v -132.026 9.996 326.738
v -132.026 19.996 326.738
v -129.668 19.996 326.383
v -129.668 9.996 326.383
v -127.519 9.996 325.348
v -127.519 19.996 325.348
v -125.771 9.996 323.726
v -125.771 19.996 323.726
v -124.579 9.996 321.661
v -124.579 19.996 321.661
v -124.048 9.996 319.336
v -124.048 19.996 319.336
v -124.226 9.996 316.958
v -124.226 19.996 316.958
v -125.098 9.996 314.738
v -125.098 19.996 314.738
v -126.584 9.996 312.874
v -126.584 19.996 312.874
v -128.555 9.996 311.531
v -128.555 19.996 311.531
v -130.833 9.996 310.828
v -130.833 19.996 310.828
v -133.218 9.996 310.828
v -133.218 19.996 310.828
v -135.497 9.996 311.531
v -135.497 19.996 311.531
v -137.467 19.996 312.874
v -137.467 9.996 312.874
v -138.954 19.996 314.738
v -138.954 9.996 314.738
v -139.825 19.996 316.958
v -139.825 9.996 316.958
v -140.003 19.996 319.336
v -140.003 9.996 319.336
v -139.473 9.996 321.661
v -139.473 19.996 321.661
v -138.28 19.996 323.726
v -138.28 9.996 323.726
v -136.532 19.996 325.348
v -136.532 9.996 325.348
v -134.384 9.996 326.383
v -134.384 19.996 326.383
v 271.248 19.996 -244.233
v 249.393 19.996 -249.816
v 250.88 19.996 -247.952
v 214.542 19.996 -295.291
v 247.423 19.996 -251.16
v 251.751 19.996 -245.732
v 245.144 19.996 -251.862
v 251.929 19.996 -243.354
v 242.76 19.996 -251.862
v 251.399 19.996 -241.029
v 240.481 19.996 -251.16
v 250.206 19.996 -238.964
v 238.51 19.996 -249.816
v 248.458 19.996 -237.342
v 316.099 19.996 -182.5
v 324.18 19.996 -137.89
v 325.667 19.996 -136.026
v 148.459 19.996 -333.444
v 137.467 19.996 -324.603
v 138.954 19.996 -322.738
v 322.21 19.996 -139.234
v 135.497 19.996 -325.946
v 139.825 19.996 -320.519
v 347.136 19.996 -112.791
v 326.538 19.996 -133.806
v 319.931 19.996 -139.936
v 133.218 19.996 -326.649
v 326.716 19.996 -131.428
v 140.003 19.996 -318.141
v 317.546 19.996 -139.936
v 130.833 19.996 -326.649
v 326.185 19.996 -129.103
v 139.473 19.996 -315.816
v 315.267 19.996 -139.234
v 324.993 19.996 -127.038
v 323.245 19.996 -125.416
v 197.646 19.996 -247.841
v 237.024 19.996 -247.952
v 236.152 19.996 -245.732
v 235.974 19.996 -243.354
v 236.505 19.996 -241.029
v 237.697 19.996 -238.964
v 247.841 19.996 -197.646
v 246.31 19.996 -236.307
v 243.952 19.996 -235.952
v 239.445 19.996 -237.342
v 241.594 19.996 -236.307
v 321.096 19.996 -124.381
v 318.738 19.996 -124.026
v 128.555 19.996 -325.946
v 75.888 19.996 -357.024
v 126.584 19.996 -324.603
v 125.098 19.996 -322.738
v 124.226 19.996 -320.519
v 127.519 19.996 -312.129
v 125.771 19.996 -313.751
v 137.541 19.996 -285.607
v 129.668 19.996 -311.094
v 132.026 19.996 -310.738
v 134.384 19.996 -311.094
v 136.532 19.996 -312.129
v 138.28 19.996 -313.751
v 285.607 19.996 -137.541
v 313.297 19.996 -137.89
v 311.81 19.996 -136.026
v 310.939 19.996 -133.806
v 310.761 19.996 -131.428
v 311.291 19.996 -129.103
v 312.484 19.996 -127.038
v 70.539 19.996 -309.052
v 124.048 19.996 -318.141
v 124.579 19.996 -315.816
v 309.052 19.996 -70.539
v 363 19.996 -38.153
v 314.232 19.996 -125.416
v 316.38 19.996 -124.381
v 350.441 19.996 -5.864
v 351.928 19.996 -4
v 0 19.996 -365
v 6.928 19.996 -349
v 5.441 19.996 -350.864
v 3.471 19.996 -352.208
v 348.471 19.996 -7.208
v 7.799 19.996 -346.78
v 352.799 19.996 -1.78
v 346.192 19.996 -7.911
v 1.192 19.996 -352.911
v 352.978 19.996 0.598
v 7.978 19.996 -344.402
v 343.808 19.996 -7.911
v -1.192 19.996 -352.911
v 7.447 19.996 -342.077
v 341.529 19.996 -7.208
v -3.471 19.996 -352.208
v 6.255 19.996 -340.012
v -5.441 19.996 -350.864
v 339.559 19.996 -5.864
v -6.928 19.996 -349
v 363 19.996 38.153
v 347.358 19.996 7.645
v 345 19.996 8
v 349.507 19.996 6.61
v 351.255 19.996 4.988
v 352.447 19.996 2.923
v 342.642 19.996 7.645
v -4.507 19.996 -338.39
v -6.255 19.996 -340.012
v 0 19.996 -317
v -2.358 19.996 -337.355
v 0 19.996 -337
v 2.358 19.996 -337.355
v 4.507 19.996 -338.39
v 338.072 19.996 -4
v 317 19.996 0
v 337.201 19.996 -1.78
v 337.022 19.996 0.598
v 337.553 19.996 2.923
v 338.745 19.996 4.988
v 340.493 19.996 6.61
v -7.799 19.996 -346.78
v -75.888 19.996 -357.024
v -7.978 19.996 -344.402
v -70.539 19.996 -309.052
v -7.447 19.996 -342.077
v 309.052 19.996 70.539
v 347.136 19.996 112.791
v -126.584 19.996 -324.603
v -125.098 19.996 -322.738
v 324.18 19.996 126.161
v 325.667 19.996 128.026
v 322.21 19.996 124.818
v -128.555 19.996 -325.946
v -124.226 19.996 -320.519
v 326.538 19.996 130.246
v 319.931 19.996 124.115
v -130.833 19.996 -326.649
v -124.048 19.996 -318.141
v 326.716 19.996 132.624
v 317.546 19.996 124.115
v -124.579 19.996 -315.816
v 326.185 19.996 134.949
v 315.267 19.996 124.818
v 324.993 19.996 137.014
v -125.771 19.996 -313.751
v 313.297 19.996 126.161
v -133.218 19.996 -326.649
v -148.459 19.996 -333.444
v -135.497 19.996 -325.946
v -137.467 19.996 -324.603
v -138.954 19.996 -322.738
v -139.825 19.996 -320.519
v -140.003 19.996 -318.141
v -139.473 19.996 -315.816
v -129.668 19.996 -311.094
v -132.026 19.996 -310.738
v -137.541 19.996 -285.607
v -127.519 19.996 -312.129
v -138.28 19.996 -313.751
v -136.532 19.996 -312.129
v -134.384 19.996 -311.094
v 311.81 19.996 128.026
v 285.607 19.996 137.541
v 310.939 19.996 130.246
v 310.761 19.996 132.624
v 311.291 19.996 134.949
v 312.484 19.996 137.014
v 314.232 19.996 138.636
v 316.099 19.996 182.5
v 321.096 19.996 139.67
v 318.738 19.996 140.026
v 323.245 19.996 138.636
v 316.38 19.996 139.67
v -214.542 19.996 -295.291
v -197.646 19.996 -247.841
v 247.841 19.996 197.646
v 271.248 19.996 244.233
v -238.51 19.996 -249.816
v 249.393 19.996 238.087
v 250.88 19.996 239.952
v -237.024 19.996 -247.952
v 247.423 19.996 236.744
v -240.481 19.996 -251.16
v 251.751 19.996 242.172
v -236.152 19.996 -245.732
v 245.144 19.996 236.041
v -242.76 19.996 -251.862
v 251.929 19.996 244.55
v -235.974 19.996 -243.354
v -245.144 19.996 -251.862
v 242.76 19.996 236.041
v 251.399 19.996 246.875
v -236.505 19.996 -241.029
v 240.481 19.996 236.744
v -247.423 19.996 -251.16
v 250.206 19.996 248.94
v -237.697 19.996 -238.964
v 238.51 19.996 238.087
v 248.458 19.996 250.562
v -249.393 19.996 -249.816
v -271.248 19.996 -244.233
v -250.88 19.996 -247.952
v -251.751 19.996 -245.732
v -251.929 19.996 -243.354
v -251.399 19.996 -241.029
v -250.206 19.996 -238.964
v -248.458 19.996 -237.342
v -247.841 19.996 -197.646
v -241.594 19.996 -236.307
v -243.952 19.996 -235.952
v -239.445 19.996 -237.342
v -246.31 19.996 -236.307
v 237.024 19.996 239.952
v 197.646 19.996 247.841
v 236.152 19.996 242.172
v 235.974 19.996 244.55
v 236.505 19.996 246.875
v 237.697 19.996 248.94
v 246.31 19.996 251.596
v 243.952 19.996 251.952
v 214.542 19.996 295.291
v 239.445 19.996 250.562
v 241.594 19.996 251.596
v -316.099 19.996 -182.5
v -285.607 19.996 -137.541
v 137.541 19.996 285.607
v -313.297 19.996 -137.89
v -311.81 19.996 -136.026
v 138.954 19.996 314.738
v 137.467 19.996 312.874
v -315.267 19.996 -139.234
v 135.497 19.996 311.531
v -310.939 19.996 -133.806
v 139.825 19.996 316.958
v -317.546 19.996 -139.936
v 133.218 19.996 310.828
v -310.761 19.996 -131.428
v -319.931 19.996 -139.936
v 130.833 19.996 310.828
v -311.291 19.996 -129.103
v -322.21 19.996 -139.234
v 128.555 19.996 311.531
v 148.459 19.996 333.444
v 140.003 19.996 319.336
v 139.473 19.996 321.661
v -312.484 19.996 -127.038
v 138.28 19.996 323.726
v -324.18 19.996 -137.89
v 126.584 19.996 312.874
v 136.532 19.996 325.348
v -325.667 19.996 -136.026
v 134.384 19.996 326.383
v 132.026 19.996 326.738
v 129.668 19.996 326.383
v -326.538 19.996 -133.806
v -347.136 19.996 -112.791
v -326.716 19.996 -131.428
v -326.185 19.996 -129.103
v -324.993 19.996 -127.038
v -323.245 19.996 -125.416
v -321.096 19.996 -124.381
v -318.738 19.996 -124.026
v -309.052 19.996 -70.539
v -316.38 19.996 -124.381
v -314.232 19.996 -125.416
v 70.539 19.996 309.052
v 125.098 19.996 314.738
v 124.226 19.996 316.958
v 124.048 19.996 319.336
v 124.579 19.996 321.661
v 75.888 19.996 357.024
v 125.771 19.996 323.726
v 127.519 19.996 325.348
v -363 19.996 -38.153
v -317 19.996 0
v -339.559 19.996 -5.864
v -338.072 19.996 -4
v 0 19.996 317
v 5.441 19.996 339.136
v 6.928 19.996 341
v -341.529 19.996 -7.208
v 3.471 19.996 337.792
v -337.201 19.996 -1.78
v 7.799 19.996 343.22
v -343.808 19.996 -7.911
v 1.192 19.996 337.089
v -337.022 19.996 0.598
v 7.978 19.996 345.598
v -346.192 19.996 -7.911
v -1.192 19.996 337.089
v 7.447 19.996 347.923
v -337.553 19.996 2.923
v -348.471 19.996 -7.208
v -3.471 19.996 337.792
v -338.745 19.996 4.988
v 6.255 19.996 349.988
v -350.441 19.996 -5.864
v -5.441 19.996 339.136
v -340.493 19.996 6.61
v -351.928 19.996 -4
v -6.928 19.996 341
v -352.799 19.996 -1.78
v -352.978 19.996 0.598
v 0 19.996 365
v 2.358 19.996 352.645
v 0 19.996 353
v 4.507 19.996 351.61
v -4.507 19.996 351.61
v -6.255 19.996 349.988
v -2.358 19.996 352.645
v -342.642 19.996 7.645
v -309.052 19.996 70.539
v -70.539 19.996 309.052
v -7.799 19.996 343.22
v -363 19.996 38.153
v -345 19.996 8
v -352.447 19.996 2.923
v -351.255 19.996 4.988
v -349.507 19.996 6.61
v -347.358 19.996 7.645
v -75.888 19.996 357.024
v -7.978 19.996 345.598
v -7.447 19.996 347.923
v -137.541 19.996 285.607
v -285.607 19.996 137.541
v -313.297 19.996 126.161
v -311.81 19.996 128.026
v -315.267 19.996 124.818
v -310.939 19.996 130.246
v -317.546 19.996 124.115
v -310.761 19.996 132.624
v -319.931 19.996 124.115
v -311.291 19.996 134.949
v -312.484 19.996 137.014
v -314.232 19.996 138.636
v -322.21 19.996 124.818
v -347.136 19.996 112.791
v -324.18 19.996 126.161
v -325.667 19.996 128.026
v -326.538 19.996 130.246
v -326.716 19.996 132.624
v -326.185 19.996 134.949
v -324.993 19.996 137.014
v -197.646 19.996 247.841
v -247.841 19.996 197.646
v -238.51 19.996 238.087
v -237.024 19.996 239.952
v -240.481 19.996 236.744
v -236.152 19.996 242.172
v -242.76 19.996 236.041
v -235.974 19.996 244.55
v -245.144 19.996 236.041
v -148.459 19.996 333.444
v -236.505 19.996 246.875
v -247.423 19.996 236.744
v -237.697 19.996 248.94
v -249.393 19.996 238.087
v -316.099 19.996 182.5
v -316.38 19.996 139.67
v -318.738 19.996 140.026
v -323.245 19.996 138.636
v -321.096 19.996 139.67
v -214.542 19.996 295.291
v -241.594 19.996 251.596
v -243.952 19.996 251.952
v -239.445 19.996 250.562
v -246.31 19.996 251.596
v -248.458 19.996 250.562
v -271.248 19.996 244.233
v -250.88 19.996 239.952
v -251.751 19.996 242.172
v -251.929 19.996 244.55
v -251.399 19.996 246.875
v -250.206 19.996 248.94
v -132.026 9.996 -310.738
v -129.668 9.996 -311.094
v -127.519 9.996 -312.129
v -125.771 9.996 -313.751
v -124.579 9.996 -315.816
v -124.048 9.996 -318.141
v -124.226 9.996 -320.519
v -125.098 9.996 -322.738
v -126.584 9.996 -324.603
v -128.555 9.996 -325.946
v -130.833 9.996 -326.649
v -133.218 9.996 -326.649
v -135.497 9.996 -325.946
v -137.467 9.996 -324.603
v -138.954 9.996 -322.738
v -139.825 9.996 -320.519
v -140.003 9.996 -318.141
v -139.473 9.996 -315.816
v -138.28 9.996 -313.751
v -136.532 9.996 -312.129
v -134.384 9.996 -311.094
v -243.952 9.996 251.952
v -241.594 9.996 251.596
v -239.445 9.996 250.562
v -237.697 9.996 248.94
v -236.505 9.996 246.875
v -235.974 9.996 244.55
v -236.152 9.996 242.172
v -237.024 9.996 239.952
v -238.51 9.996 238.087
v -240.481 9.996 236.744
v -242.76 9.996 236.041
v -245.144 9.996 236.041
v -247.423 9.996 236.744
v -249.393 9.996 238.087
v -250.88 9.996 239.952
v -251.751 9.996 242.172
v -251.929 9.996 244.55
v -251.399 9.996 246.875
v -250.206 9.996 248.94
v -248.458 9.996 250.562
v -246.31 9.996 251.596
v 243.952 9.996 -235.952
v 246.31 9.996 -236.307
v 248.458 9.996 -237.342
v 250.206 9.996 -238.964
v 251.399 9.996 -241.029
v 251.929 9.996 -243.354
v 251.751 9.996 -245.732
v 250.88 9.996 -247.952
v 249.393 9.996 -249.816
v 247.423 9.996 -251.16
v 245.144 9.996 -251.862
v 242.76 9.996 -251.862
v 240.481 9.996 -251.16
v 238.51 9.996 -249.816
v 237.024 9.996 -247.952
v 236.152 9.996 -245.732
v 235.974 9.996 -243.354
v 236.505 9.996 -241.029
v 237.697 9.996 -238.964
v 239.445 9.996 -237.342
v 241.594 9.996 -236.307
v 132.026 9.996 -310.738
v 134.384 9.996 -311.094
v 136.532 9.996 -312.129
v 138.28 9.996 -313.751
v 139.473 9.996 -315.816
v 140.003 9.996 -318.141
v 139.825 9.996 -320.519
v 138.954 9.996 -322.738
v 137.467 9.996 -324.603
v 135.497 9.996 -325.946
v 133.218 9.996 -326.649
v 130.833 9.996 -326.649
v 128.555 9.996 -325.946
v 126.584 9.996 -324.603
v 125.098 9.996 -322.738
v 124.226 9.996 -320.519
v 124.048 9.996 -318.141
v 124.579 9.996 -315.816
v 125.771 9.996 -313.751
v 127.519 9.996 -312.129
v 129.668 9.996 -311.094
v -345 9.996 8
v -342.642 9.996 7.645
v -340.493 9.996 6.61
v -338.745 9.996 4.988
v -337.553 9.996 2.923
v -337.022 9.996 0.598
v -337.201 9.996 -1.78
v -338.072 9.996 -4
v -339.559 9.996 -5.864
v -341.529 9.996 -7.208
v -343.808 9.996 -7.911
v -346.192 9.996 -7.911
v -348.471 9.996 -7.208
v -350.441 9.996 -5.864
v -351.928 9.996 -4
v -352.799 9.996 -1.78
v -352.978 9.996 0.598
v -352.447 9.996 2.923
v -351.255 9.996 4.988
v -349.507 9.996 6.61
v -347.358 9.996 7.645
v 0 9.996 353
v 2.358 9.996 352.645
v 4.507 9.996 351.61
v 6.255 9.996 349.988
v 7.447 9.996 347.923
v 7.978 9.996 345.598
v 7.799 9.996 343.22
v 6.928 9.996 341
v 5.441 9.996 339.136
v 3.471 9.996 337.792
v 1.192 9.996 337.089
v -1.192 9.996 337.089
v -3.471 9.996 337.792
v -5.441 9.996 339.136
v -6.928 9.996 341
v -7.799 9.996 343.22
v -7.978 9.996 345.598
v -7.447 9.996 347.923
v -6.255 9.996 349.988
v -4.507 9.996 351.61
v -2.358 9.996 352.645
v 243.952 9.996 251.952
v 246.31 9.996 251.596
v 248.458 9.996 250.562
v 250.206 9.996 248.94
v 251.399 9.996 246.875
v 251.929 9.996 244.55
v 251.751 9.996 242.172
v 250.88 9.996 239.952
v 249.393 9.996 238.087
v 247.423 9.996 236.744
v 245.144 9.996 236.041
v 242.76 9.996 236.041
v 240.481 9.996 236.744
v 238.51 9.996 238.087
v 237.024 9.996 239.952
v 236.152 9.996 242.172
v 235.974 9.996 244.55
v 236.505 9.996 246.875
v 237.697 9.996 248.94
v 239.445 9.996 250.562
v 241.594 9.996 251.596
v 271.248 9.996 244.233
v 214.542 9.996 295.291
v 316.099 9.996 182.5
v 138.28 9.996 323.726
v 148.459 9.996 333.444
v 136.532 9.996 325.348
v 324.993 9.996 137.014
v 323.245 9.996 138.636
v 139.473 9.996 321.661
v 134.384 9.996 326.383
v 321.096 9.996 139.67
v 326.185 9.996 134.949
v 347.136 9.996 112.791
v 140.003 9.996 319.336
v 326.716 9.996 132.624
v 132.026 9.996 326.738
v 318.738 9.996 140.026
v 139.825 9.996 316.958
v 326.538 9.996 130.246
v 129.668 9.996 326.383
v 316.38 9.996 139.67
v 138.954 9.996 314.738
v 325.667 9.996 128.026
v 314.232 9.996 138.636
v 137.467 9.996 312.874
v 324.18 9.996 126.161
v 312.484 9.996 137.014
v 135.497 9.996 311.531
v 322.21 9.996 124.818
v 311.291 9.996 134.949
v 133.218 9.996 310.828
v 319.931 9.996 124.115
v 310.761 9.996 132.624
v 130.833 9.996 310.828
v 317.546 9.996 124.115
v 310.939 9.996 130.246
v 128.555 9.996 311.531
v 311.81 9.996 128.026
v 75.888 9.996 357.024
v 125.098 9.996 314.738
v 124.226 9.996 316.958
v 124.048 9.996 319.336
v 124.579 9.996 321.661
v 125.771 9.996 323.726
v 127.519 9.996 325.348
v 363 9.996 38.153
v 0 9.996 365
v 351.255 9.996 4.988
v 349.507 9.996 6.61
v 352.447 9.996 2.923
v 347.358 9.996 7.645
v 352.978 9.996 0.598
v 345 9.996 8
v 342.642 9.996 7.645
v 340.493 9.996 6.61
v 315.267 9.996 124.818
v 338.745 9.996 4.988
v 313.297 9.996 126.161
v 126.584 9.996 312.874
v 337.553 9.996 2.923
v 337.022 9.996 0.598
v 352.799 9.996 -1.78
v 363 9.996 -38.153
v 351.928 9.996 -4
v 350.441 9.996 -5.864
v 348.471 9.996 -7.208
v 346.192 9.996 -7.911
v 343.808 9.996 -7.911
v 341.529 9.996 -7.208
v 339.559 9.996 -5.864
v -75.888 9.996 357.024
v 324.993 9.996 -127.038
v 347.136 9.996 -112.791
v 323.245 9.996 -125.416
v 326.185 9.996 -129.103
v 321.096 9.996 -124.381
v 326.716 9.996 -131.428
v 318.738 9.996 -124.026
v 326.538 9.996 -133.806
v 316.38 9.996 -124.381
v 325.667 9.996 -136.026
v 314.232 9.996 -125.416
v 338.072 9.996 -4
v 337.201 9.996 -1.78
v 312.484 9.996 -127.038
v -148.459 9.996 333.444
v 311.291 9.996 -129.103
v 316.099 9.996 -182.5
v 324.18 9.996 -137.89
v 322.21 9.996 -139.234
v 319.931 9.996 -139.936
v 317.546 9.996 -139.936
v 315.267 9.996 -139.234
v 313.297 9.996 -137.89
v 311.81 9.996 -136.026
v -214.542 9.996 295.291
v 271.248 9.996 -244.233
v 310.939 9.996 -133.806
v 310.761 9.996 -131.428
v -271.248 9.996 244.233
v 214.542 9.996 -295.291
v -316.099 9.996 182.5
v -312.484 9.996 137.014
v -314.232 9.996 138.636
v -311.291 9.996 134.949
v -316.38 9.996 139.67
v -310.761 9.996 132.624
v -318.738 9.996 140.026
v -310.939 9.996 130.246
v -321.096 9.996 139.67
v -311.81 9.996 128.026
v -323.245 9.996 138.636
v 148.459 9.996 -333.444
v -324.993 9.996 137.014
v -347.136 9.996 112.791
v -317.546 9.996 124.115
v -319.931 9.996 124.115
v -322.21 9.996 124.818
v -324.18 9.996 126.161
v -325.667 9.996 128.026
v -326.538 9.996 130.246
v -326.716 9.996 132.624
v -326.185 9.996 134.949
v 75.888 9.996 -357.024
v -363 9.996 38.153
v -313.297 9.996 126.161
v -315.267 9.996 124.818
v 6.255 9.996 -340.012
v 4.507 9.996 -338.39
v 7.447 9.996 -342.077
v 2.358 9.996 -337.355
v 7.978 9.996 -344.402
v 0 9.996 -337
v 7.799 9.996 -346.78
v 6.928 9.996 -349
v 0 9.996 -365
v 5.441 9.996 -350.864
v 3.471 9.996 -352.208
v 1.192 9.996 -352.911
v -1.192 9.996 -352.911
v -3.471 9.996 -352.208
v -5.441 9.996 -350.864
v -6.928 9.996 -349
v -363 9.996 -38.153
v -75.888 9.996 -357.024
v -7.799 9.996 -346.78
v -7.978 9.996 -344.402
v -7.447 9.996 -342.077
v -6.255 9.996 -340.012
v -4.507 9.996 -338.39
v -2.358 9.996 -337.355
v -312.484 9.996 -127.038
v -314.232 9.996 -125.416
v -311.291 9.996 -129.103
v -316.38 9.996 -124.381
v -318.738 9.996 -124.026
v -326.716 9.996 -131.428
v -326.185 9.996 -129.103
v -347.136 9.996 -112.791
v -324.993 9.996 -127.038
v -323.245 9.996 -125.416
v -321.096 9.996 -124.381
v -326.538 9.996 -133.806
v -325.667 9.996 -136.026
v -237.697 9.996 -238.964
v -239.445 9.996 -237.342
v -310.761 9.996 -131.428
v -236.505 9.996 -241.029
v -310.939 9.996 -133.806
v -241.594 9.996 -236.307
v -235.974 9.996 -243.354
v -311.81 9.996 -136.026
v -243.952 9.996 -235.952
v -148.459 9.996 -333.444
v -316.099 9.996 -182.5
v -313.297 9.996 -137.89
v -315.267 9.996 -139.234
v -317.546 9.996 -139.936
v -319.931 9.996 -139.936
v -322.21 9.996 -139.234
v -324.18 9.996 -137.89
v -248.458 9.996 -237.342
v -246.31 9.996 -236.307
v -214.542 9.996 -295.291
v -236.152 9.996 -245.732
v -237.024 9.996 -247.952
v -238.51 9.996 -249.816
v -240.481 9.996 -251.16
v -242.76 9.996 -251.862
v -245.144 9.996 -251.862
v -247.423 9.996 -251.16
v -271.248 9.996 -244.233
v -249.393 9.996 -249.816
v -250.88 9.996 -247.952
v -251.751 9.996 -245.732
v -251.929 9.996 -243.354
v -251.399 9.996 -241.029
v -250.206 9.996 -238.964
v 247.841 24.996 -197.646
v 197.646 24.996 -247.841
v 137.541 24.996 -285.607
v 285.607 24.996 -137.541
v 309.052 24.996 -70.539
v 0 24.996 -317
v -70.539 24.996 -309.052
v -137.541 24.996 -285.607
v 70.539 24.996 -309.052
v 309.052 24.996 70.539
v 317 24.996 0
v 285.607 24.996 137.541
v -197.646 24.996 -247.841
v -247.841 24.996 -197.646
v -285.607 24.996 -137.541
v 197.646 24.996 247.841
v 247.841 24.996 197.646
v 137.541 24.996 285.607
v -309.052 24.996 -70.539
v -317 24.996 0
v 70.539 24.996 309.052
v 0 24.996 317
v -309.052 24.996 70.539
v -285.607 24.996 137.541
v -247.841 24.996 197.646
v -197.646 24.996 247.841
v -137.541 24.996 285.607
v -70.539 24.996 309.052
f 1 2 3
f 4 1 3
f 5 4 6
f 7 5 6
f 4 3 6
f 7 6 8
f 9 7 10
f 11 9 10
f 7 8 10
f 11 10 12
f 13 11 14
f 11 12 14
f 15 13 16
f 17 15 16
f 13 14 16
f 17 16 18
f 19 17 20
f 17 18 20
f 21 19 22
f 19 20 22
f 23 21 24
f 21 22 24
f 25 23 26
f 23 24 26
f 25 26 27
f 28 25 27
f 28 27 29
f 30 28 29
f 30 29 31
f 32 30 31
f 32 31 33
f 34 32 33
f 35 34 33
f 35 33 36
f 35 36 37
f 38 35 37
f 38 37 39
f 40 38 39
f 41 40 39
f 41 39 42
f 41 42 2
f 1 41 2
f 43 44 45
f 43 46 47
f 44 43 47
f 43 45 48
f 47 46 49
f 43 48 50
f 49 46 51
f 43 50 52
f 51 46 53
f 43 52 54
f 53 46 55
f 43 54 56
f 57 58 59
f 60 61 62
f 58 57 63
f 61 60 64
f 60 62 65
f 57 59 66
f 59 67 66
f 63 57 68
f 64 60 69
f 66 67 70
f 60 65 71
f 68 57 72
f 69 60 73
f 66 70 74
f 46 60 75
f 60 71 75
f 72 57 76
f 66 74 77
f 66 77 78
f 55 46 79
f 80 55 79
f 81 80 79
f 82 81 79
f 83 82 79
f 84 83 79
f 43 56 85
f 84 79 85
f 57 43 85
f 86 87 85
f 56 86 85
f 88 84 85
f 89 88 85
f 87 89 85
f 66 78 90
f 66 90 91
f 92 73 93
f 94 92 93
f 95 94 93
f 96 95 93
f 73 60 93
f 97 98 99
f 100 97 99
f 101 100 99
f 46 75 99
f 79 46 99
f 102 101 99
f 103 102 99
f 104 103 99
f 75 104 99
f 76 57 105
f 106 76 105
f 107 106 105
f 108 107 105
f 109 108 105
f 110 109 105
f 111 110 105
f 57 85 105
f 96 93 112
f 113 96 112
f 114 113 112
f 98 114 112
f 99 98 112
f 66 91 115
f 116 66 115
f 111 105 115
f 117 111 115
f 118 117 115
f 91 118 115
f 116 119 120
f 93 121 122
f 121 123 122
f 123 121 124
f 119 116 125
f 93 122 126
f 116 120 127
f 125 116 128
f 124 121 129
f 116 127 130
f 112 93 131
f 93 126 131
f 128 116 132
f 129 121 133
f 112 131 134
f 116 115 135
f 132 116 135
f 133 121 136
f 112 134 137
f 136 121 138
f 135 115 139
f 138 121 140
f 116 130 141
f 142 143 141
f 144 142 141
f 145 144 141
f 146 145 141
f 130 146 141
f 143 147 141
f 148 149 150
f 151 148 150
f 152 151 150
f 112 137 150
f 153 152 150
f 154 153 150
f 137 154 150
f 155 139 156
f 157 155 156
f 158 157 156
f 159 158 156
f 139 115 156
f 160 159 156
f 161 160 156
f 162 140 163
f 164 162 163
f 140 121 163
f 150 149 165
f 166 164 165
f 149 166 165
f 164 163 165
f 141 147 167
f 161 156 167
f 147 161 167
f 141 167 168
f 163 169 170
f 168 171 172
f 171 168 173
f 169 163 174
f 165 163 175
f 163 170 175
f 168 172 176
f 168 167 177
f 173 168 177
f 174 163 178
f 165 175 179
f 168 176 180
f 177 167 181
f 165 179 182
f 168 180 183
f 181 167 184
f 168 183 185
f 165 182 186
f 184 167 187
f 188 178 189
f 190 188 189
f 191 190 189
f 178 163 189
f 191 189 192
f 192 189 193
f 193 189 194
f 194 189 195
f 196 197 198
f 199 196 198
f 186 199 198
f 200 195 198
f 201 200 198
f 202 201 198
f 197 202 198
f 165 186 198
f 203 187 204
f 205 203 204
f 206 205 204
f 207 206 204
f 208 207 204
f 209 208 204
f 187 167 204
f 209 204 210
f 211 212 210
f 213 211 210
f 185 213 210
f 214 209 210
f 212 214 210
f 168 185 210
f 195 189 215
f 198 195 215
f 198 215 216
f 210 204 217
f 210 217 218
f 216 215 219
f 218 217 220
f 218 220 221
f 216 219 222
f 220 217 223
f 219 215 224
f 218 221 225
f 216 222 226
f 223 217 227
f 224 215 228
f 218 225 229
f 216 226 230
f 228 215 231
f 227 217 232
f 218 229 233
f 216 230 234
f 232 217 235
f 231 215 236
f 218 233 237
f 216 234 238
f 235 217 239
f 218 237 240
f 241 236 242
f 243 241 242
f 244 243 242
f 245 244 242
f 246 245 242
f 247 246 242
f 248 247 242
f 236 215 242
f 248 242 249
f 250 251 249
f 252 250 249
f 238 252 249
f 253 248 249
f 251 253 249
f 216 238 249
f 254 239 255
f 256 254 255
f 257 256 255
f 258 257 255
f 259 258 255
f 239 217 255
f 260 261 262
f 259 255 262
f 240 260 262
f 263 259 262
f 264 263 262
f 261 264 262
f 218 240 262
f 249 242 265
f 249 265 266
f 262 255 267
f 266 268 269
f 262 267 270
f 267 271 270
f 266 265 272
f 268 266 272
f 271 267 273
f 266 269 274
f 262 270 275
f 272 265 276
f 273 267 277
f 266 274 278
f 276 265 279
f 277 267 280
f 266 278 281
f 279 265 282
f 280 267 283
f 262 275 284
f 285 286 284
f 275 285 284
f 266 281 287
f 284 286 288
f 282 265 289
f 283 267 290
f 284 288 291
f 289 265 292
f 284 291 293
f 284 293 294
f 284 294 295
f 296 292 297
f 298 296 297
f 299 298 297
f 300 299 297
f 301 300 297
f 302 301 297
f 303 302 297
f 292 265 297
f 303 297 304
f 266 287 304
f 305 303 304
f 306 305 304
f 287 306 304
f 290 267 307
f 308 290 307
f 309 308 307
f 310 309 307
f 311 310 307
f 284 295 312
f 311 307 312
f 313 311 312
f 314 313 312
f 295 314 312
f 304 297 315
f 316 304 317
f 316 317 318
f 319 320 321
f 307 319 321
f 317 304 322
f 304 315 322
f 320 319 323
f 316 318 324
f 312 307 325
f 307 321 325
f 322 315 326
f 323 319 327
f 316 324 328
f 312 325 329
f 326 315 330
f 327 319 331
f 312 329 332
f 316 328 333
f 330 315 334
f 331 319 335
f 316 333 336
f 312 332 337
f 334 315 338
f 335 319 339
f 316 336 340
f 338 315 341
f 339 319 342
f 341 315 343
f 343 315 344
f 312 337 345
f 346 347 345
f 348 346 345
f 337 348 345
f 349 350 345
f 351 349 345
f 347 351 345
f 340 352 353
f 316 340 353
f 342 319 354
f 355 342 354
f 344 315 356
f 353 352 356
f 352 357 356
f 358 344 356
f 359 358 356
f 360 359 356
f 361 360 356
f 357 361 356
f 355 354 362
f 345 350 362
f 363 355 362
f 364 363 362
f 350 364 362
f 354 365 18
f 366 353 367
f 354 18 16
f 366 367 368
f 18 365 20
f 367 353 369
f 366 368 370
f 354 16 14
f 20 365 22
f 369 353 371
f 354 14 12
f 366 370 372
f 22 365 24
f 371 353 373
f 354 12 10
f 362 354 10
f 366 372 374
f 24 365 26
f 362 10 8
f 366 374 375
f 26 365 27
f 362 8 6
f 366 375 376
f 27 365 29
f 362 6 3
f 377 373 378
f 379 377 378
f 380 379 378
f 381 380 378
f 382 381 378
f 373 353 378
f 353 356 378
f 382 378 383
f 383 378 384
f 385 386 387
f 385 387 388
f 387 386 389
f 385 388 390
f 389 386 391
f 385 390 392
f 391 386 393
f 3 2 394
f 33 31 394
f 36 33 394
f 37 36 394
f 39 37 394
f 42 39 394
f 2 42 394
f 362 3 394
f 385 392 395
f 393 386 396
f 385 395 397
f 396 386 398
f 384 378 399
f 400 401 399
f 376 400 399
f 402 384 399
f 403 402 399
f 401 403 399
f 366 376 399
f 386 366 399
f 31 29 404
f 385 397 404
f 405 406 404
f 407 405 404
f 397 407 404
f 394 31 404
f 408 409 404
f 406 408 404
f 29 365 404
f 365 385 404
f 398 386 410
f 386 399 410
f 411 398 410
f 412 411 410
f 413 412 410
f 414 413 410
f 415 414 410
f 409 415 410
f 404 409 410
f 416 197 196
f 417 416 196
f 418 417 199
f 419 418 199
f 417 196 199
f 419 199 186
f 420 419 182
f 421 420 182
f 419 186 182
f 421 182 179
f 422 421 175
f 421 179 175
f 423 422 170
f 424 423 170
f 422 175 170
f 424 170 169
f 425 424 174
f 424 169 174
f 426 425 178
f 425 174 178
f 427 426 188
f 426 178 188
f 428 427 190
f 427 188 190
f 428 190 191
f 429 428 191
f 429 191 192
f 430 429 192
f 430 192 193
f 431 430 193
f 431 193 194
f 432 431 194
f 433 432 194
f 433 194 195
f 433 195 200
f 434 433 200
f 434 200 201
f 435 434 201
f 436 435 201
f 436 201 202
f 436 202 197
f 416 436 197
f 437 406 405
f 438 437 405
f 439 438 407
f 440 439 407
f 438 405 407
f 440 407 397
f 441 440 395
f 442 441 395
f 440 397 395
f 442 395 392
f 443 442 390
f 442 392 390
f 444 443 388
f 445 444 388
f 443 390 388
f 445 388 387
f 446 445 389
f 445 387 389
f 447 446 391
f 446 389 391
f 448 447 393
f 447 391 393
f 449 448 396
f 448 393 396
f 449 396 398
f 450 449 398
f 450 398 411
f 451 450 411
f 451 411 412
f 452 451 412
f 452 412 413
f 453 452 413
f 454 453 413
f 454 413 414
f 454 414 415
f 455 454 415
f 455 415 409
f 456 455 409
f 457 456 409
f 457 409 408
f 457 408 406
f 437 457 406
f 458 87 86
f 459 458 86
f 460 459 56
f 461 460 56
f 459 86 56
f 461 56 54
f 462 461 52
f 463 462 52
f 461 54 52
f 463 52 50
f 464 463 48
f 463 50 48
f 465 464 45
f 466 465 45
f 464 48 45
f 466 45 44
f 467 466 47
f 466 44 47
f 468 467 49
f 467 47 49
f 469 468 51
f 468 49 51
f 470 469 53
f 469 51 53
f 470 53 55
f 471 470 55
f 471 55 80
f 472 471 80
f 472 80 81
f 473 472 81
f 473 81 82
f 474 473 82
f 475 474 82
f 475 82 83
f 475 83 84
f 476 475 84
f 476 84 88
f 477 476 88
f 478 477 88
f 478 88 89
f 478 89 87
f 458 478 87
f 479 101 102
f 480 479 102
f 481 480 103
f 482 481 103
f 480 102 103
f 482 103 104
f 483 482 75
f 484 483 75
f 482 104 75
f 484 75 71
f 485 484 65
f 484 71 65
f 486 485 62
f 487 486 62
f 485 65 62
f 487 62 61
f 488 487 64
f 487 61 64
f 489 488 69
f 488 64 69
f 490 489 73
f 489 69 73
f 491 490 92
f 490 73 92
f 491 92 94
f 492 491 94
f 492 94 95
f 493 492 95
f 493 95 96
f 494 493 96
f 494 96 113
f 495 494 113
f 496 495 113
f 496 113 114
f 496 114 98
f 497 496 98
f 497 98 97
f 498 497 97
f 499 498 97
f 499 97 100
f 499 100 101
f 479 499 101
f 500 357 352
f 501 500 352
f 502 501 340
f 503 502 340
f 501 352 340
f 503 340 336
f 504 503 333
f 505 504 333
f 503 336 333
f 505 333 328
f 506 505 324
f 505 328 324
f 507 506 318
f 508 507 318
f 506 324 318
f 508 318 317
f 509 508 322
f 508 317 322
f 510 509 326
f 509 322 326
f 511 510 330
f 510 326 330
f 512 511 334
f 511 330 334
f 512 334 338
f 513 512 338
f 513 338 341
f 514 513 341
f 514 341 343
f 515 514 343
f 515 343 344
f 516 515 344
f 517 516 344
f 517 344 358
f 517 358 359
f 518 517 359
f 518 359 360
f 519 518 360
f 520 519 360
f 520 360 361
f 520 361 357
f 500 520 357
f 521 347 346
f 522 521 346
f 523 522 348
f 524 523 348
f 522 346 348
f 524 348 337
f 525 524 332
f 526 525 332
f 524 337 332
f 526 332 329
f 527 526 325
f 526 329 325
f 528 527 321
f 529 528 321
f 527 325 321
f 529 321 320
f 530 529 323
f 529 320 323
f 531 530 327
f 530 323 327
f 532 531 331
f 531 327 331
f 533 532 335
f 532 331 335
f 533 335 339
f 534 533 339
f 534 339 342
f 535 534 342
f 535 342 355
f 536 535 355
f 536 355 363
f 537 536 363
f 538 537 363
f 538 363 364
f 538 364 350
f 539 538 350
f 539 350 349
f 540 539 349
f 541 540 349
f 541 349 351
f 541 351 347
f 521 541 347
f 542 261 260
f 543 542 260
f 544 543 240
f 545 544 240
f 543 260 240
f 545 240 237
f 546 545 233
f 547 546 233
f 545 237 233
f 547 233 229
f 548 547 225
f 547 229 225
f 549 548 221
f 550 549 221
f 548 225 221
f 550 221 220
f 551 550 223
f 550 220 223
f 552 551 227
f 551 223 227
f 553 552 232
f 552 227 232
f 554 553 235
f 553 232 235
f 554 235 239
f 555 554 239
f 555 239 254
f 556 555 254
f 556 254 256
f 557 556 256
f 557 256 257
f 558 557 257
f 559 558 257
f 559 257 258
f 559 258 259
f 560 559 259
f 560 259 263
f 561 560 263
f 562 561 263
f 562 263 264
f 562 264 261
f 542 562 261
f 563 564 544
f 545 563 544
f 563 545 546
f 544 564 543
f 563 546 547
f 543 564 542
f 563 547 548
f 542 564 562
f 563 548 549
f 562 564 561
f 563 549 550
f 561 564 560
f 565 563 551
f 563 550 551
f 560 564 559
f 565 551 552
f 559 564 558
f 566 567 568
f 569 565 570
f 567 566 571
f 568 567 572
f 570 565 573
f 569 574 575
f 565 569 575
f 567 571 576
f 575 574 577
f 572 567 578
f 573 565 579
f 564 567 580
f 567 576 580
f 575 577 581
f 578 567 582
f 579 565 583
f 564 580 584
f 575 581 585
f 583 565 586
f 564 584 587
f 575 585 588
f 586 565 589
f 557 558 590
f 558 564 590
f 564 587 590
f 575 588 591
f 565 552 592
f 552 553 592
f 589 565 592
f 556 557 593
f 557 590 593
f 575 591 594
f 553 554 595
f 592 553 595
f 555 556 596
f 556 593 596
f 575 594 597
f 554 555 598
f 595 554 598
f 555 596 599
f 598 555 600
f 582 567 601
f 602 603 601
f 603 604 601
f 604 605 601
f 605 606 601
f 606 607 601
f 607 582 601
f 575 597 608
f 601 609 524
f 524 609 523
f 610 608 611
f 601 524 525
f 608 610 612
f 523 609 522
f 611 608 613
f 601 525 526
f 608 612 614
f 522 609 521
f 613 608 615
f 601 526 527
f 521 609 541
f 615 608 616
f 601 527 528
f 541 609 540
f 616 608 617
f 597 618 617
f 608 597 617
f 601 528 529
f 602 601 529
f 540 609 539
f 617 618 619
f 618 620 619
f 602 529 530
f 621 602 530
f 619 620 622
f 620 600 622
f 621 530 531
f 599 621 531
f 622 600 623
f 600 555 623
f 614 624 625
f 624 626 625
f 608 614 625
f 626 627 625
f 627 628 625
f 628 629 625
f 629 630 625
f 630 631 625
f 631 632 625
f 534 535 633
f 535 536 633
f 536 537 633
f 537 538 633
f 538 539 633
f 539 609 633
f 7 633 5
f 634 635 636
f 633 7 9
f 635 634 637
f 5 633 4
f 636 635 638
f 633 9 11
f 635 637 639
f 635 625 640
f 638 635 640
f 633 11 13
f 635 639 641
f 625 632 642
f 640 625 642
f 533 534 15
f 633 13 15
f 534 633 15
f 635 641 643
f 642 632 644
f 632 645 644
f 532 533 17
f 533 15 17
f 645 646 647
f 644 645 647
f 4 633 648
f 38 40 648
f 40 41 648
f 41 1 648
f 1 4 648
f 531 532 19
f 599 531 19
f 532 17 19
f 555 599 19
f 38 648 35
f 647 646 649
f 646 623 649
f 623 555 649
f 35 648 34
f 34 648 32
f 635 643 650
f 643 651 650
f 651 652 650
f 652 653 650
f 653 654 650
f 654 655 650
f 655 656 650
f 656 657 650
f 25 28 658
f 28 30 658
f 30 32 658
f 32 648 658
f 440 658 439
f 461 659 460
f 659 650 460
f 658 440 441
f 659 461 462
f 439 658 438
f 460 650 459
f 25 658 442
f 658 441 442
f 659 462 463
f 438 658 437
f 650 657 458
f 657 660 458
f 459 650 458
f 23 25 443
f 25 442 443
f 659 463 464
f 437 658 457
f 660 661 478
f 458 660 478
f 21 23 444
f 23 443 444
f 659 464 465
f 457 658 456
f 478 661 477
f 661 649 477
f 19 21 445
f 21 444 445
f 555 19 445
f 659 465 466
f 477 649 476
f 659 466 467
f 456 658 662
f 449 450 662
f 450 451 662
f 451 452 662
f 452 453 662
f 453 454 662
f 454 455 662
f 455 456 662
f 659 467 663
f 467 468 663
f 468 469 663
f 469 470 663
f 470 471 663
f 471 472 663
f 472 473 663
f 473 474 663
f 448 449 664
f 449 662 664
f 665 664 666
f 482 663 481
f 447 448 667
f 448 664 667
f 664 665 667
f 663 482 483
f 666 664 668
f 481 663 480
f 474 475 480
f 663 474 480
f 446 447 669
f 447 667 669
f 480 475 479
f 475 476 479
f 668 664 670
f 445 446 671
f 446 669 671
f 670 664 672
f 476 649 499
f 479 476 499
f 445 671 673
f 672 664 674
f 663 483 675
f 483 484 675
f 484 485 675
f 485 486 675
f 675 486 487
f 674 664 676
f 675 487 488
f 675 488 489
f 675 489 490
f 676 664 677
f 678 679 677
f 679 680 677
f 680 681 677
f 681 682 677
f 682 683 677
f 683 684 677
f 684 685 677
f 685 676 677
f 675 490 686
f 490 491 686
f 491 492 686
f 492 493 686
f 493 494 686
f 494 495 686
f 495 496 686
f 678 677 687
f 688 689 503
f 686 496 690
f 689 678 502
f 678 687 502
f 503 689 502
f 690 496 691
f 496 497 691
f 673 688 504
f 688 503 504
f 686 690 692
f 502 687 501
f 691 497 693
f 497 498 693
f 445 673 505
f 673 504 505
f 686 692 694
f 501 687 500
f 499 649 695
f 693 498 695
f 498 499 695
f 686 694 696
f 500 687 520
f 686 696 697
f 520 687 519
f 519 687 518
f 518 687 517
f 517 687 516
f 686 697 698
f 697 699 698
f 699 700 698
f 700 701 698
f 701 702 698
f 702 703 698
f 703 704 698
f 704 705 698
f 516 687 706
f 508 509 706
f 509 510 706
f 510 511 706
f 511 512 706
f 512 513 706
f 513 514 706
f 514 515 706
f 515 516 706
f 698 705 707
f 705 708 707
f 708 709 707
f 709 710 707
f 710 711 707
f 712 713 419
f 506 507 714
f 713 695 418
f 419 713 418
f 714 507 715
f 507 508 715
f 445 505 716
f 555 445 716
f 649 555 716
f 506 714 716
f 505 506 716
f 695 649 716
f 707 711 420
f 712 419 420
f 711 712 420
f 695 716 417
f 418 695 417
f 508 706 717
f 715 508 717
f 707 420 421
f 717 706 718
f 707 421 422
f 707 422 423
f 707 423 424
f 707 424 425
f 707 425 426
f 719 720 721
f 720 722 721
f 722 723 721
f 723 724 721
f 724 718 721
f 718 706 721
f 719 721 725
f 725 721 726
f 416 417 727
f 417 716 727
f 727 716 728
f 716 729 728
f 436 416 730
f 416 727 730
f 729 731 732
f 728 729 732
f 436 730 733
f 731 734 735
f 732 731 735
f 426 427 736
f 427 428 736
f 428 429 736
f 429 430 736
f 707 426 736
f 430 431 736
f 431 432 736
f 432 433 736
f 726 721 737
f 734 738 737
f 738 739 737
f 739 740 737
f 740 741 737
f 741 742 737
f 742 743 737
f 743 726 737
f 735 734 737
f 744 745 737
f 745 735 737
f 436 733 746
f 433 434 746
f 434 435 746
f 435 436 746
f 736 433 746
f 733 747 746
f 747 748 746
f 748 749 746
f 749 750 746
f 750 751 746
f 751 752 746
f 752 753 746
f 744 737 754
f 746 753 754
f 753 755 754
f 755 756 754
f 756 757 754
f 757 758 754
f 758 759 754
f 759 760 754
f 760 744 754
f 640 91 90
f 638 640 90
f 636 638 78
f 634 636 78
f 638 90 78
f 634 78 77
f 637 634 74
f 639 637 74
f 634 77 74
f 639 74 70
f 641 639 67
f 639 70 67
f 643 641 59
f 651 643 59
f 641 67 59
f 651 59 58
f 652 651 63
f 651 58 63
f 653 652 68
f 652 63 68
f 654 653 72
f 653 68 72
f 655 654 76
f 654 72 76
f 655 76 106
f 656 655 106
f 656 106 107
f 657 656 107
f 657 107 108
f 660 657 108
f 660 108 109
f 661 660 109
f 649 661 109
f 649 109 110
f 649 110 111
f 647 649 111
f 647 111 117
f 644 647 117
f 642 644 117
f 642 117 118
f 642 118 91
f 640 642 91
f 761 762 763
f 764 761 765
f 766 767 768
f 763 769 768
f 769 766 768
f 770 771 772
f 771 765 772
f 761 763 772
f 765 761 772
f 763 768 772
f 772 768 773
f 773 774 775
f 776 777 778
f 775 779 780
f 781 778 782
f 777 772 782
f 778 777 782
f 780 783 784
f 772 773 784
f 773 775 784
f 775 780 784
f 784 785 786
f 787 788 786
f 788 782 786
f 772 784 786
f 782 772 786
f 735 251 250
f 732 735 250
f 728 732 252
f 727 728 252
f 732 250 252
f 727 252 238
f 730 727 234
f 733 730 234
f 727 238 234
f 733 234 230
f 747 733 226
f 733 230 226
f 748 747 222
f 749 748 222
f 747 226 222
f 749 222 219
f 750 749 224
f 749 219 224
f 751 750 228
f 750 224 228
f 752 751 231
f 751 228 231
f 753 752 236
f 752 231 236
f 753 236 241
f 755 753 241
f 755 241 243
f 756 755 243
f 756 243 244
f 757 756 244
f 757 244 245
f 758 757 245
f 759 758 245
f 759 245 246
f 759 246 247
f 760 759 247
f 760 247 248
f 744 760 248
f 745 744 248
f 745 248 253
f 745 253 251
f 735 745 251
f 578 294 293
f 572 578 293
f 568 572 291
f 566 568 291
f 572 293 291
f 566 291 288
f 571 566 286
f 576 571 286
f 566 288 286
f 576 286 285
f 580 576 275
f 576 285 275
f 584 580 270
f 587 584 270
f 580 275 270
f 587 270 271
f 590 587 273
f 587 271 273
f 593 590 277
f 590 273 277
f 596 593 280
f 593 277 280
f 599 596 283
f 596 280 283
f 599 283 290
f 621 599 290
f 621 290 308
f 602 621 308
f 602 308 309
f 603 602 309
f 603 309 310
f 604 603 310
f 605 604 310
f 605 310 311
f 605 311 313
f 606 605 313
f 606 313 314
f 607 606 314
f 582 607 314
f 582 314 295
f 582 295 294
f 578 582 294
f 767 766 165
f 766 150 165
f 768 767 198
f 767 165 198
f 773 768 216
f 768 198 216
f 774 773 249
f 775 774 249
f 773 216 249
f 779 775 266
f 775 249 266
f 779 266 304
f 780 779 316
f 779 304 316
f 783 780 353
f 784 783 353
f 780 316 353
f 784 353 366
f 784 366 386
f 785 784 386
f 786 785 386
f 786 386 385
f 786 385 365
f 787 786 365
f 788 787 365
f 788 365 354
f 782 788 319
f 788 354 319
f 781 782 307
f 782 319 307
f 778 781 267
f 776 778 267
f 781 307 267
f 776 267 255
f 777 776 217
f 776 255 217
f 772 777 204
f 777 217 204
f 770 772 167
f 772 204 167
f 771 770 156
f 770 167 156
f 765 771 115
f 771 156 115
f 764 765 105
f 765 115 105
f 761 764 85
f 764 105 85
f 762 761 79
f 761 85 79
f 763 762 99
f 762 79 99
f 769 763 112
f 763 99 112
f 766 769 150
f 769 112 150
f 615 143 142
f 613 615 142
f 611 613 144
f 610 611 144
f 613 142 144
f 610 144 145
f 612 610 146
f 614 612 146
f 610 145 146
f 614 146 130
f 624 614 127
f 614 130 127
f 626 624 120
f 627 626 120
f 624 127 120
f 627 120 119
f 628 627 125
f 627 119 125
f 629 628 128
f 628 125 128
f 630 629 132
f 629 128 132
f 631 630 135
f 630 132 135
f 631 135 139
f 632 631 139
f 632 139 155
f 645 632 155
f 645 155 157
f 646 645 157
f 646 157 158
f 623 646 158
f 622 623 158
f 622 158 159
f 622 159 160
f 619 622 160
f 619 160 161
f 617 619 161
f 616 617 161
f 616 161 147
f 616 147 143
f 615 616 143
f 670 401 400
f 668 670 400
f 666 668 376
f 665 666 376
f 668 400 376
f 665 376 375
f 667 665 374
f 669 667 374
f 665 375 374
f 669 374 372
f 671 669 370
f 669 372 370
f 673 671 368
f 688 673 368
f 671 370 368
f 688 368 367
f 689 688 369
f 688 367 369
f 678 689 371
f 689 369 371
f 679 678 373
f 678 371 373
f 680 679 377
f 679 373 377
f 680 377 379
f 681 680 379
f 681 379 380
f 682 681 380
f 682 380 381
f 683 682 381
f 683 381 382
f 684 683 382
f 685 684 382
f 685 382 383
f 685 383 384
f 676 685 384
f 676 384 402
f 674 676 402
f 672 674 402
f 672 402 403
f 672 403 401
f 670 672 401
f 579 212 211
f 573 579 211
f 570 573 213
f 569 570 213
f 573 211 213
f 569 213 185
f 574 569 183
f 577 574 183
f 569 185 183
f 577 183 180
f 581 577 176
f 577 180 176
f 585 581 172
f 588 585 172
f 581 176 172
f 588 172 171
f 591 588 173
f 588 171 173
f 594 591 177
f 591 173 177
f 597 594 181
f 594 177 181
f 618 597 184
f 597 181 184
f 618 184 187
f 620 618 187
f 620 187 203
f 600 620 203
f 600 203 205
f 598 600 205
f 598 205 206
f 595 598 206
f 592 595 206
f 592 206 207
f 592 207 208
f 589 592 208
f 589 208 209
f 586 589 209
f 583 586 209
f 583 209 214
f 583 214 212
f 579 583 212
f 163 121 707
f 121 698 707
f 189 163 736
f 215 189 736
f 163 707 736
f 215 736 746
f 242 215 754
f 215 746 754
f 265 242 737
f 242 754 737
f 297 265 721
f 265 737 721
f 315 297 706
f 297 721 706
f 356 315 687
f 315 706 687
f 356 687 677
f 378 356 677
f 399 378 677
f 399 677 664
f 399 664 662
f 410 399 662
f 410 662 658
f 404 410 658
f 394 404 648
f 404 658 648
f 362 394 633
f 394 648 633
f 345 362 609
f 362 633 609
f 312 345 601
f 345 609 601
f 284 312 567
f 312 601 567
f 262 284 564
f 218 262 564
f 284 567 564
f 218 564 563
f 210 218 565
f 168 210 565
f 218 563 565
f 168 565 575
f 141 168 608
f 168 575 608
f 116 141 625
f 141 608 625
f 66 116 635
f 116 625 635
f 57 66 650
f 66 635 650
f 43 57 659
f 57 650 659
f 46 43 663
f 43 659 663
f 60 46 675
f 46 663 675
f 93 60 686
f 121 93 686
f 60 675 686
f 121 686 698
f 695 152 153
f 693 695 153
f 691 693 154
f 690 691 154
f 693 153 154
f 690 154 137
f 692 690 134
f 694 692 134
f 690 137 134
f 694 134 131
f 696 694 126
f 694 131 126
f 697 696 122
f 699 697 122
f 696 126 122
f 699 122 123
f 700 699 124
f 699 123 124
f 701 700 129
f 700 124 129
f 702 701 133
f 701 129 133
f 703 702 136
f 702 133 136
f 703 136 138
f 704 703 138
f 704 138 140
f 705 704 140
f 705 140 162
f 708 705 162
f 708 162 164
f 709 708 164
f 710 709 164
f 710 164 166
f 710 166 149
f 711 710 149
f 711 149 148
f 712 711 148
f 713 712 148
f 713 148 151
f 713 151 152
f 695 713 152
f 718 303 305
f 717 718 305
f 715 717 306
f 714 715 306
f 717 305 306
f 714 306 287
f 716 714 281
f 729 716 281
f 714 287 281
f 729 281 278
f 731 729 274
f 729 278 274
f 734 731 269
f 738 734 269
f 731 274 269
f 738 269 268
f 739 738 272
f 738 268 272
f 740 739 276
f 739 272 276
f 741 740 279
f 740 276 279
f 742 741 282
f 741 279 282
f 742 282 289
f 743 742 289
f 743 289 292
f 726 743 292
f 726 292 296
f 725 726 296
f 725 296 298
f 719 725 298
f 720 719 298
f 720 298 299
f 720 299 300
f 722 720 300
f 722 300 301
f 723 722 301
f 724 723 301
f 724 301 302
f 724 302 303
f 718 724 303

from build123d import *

# Parameters (mm, degrees)
SKETCH2_R          = 8
CUT_EXTRUDE1_DEPTH = 517.284805122


with BuildPart() as part:
    # Sketch1 → Revolve1 (revolve)
    with BuildSketch(Plane(origin=(0, 0, 0), x_dir=(0, 0, -1), z_dir=(1, 0, 0)), mode=Mode.PRIVATE) as revolve1_sk:
        Polygon((-365, 19.995973642), (-365, 9.995973642), (0, 9.995973642), (0, 24.995973642), (-317, 24.995973642), (-317, 19.995973642), align=None)
    revolve(revolve1_sk.sketch.rotate(Axis((0, 9.995973642, 0), (0, 1, 0)), 180), axis=Axis((0, 9.995973642, 0), (0, 1, 0)))

    # Sketch2 → Cut-Extrude1 (cut, through all)
    with BuildSketch(Plane(origin=(0, 19.995973642, 0), x_dir=(1, 0, 0), z_dir=(0, 1, 0))):
        with Locations(Location((0, 345, 0), (0, 0, 270))):
            Circle(SKETCH2_R)
        with Locations(Location((132.025784166, 318.738438716, 0), (0, 0, 270))):
            Circle(SKETCH2_R)
        with Locations(Location((243.951839509, 243.951839509, 0), (0, 0, 270))):
            Circle(SKETCH2_R)
        with Locations(Location((318.738438716, 132.025784166, 0), (0, 0, 270))):
            Circle(SKETCH2_R)
        with Locations(Location((345, 0, 0), (0, 0, 270))):
            Circle(SKETCH2_R)
        with Locations(Location((318.738438716, -132.025784166, 0), (0, 0, 270))):
            Circle(SKETCH2_R)
        with Locations(Location((243.951839509, -243.951839509, 0), (0, 0, 270))):
            Circle(SKETCH2_R)
        with Locations(Location((132.025784166, -318.738438716, 0), (0, 0, 270))):
            Circle(SKETCH2_R)
        with Locations(Location((0, -345, 0), (0, 0, 270))):
            Circle(SKETCH2_R)
        with Locations(Location((-132.025784166, -318.738438716, 0), (0, 0, 270))):
            Circle(SKETCH2_R)
        with Locations(Location((-243.951839509, -243.951839509, 0), (0, 0, 270))):
            Circle(SKETCH2_R)
        with Locations(Location((-318.738438716, -132.025784166, 0), (0, 0, 270))):
            Circle(SKETCH2_R)
        with Locations(Location((-345, 0, 0), (0, 0, 270))):
            Circle(SKETCH2_R)
        with Locations(Location((-318.738438716, 132.025784166, 0), (0, 0, 270))):
            Circle(SKETCH2_R)
        with Locations(Location((-243.951839509, 243.951839509, 0), (0, 0, 270))):
            Circle(SKETCH2_R)
        with Locations(Location((-132.025784166, 318.738438716, 0), (0, 0, 270))):
            Circle(SKETCH2_R)
    extrude(amount=-CUT_EXTRUDE1_DEPTH, mode=Mode.SUBTRACT)


solid = part.part
